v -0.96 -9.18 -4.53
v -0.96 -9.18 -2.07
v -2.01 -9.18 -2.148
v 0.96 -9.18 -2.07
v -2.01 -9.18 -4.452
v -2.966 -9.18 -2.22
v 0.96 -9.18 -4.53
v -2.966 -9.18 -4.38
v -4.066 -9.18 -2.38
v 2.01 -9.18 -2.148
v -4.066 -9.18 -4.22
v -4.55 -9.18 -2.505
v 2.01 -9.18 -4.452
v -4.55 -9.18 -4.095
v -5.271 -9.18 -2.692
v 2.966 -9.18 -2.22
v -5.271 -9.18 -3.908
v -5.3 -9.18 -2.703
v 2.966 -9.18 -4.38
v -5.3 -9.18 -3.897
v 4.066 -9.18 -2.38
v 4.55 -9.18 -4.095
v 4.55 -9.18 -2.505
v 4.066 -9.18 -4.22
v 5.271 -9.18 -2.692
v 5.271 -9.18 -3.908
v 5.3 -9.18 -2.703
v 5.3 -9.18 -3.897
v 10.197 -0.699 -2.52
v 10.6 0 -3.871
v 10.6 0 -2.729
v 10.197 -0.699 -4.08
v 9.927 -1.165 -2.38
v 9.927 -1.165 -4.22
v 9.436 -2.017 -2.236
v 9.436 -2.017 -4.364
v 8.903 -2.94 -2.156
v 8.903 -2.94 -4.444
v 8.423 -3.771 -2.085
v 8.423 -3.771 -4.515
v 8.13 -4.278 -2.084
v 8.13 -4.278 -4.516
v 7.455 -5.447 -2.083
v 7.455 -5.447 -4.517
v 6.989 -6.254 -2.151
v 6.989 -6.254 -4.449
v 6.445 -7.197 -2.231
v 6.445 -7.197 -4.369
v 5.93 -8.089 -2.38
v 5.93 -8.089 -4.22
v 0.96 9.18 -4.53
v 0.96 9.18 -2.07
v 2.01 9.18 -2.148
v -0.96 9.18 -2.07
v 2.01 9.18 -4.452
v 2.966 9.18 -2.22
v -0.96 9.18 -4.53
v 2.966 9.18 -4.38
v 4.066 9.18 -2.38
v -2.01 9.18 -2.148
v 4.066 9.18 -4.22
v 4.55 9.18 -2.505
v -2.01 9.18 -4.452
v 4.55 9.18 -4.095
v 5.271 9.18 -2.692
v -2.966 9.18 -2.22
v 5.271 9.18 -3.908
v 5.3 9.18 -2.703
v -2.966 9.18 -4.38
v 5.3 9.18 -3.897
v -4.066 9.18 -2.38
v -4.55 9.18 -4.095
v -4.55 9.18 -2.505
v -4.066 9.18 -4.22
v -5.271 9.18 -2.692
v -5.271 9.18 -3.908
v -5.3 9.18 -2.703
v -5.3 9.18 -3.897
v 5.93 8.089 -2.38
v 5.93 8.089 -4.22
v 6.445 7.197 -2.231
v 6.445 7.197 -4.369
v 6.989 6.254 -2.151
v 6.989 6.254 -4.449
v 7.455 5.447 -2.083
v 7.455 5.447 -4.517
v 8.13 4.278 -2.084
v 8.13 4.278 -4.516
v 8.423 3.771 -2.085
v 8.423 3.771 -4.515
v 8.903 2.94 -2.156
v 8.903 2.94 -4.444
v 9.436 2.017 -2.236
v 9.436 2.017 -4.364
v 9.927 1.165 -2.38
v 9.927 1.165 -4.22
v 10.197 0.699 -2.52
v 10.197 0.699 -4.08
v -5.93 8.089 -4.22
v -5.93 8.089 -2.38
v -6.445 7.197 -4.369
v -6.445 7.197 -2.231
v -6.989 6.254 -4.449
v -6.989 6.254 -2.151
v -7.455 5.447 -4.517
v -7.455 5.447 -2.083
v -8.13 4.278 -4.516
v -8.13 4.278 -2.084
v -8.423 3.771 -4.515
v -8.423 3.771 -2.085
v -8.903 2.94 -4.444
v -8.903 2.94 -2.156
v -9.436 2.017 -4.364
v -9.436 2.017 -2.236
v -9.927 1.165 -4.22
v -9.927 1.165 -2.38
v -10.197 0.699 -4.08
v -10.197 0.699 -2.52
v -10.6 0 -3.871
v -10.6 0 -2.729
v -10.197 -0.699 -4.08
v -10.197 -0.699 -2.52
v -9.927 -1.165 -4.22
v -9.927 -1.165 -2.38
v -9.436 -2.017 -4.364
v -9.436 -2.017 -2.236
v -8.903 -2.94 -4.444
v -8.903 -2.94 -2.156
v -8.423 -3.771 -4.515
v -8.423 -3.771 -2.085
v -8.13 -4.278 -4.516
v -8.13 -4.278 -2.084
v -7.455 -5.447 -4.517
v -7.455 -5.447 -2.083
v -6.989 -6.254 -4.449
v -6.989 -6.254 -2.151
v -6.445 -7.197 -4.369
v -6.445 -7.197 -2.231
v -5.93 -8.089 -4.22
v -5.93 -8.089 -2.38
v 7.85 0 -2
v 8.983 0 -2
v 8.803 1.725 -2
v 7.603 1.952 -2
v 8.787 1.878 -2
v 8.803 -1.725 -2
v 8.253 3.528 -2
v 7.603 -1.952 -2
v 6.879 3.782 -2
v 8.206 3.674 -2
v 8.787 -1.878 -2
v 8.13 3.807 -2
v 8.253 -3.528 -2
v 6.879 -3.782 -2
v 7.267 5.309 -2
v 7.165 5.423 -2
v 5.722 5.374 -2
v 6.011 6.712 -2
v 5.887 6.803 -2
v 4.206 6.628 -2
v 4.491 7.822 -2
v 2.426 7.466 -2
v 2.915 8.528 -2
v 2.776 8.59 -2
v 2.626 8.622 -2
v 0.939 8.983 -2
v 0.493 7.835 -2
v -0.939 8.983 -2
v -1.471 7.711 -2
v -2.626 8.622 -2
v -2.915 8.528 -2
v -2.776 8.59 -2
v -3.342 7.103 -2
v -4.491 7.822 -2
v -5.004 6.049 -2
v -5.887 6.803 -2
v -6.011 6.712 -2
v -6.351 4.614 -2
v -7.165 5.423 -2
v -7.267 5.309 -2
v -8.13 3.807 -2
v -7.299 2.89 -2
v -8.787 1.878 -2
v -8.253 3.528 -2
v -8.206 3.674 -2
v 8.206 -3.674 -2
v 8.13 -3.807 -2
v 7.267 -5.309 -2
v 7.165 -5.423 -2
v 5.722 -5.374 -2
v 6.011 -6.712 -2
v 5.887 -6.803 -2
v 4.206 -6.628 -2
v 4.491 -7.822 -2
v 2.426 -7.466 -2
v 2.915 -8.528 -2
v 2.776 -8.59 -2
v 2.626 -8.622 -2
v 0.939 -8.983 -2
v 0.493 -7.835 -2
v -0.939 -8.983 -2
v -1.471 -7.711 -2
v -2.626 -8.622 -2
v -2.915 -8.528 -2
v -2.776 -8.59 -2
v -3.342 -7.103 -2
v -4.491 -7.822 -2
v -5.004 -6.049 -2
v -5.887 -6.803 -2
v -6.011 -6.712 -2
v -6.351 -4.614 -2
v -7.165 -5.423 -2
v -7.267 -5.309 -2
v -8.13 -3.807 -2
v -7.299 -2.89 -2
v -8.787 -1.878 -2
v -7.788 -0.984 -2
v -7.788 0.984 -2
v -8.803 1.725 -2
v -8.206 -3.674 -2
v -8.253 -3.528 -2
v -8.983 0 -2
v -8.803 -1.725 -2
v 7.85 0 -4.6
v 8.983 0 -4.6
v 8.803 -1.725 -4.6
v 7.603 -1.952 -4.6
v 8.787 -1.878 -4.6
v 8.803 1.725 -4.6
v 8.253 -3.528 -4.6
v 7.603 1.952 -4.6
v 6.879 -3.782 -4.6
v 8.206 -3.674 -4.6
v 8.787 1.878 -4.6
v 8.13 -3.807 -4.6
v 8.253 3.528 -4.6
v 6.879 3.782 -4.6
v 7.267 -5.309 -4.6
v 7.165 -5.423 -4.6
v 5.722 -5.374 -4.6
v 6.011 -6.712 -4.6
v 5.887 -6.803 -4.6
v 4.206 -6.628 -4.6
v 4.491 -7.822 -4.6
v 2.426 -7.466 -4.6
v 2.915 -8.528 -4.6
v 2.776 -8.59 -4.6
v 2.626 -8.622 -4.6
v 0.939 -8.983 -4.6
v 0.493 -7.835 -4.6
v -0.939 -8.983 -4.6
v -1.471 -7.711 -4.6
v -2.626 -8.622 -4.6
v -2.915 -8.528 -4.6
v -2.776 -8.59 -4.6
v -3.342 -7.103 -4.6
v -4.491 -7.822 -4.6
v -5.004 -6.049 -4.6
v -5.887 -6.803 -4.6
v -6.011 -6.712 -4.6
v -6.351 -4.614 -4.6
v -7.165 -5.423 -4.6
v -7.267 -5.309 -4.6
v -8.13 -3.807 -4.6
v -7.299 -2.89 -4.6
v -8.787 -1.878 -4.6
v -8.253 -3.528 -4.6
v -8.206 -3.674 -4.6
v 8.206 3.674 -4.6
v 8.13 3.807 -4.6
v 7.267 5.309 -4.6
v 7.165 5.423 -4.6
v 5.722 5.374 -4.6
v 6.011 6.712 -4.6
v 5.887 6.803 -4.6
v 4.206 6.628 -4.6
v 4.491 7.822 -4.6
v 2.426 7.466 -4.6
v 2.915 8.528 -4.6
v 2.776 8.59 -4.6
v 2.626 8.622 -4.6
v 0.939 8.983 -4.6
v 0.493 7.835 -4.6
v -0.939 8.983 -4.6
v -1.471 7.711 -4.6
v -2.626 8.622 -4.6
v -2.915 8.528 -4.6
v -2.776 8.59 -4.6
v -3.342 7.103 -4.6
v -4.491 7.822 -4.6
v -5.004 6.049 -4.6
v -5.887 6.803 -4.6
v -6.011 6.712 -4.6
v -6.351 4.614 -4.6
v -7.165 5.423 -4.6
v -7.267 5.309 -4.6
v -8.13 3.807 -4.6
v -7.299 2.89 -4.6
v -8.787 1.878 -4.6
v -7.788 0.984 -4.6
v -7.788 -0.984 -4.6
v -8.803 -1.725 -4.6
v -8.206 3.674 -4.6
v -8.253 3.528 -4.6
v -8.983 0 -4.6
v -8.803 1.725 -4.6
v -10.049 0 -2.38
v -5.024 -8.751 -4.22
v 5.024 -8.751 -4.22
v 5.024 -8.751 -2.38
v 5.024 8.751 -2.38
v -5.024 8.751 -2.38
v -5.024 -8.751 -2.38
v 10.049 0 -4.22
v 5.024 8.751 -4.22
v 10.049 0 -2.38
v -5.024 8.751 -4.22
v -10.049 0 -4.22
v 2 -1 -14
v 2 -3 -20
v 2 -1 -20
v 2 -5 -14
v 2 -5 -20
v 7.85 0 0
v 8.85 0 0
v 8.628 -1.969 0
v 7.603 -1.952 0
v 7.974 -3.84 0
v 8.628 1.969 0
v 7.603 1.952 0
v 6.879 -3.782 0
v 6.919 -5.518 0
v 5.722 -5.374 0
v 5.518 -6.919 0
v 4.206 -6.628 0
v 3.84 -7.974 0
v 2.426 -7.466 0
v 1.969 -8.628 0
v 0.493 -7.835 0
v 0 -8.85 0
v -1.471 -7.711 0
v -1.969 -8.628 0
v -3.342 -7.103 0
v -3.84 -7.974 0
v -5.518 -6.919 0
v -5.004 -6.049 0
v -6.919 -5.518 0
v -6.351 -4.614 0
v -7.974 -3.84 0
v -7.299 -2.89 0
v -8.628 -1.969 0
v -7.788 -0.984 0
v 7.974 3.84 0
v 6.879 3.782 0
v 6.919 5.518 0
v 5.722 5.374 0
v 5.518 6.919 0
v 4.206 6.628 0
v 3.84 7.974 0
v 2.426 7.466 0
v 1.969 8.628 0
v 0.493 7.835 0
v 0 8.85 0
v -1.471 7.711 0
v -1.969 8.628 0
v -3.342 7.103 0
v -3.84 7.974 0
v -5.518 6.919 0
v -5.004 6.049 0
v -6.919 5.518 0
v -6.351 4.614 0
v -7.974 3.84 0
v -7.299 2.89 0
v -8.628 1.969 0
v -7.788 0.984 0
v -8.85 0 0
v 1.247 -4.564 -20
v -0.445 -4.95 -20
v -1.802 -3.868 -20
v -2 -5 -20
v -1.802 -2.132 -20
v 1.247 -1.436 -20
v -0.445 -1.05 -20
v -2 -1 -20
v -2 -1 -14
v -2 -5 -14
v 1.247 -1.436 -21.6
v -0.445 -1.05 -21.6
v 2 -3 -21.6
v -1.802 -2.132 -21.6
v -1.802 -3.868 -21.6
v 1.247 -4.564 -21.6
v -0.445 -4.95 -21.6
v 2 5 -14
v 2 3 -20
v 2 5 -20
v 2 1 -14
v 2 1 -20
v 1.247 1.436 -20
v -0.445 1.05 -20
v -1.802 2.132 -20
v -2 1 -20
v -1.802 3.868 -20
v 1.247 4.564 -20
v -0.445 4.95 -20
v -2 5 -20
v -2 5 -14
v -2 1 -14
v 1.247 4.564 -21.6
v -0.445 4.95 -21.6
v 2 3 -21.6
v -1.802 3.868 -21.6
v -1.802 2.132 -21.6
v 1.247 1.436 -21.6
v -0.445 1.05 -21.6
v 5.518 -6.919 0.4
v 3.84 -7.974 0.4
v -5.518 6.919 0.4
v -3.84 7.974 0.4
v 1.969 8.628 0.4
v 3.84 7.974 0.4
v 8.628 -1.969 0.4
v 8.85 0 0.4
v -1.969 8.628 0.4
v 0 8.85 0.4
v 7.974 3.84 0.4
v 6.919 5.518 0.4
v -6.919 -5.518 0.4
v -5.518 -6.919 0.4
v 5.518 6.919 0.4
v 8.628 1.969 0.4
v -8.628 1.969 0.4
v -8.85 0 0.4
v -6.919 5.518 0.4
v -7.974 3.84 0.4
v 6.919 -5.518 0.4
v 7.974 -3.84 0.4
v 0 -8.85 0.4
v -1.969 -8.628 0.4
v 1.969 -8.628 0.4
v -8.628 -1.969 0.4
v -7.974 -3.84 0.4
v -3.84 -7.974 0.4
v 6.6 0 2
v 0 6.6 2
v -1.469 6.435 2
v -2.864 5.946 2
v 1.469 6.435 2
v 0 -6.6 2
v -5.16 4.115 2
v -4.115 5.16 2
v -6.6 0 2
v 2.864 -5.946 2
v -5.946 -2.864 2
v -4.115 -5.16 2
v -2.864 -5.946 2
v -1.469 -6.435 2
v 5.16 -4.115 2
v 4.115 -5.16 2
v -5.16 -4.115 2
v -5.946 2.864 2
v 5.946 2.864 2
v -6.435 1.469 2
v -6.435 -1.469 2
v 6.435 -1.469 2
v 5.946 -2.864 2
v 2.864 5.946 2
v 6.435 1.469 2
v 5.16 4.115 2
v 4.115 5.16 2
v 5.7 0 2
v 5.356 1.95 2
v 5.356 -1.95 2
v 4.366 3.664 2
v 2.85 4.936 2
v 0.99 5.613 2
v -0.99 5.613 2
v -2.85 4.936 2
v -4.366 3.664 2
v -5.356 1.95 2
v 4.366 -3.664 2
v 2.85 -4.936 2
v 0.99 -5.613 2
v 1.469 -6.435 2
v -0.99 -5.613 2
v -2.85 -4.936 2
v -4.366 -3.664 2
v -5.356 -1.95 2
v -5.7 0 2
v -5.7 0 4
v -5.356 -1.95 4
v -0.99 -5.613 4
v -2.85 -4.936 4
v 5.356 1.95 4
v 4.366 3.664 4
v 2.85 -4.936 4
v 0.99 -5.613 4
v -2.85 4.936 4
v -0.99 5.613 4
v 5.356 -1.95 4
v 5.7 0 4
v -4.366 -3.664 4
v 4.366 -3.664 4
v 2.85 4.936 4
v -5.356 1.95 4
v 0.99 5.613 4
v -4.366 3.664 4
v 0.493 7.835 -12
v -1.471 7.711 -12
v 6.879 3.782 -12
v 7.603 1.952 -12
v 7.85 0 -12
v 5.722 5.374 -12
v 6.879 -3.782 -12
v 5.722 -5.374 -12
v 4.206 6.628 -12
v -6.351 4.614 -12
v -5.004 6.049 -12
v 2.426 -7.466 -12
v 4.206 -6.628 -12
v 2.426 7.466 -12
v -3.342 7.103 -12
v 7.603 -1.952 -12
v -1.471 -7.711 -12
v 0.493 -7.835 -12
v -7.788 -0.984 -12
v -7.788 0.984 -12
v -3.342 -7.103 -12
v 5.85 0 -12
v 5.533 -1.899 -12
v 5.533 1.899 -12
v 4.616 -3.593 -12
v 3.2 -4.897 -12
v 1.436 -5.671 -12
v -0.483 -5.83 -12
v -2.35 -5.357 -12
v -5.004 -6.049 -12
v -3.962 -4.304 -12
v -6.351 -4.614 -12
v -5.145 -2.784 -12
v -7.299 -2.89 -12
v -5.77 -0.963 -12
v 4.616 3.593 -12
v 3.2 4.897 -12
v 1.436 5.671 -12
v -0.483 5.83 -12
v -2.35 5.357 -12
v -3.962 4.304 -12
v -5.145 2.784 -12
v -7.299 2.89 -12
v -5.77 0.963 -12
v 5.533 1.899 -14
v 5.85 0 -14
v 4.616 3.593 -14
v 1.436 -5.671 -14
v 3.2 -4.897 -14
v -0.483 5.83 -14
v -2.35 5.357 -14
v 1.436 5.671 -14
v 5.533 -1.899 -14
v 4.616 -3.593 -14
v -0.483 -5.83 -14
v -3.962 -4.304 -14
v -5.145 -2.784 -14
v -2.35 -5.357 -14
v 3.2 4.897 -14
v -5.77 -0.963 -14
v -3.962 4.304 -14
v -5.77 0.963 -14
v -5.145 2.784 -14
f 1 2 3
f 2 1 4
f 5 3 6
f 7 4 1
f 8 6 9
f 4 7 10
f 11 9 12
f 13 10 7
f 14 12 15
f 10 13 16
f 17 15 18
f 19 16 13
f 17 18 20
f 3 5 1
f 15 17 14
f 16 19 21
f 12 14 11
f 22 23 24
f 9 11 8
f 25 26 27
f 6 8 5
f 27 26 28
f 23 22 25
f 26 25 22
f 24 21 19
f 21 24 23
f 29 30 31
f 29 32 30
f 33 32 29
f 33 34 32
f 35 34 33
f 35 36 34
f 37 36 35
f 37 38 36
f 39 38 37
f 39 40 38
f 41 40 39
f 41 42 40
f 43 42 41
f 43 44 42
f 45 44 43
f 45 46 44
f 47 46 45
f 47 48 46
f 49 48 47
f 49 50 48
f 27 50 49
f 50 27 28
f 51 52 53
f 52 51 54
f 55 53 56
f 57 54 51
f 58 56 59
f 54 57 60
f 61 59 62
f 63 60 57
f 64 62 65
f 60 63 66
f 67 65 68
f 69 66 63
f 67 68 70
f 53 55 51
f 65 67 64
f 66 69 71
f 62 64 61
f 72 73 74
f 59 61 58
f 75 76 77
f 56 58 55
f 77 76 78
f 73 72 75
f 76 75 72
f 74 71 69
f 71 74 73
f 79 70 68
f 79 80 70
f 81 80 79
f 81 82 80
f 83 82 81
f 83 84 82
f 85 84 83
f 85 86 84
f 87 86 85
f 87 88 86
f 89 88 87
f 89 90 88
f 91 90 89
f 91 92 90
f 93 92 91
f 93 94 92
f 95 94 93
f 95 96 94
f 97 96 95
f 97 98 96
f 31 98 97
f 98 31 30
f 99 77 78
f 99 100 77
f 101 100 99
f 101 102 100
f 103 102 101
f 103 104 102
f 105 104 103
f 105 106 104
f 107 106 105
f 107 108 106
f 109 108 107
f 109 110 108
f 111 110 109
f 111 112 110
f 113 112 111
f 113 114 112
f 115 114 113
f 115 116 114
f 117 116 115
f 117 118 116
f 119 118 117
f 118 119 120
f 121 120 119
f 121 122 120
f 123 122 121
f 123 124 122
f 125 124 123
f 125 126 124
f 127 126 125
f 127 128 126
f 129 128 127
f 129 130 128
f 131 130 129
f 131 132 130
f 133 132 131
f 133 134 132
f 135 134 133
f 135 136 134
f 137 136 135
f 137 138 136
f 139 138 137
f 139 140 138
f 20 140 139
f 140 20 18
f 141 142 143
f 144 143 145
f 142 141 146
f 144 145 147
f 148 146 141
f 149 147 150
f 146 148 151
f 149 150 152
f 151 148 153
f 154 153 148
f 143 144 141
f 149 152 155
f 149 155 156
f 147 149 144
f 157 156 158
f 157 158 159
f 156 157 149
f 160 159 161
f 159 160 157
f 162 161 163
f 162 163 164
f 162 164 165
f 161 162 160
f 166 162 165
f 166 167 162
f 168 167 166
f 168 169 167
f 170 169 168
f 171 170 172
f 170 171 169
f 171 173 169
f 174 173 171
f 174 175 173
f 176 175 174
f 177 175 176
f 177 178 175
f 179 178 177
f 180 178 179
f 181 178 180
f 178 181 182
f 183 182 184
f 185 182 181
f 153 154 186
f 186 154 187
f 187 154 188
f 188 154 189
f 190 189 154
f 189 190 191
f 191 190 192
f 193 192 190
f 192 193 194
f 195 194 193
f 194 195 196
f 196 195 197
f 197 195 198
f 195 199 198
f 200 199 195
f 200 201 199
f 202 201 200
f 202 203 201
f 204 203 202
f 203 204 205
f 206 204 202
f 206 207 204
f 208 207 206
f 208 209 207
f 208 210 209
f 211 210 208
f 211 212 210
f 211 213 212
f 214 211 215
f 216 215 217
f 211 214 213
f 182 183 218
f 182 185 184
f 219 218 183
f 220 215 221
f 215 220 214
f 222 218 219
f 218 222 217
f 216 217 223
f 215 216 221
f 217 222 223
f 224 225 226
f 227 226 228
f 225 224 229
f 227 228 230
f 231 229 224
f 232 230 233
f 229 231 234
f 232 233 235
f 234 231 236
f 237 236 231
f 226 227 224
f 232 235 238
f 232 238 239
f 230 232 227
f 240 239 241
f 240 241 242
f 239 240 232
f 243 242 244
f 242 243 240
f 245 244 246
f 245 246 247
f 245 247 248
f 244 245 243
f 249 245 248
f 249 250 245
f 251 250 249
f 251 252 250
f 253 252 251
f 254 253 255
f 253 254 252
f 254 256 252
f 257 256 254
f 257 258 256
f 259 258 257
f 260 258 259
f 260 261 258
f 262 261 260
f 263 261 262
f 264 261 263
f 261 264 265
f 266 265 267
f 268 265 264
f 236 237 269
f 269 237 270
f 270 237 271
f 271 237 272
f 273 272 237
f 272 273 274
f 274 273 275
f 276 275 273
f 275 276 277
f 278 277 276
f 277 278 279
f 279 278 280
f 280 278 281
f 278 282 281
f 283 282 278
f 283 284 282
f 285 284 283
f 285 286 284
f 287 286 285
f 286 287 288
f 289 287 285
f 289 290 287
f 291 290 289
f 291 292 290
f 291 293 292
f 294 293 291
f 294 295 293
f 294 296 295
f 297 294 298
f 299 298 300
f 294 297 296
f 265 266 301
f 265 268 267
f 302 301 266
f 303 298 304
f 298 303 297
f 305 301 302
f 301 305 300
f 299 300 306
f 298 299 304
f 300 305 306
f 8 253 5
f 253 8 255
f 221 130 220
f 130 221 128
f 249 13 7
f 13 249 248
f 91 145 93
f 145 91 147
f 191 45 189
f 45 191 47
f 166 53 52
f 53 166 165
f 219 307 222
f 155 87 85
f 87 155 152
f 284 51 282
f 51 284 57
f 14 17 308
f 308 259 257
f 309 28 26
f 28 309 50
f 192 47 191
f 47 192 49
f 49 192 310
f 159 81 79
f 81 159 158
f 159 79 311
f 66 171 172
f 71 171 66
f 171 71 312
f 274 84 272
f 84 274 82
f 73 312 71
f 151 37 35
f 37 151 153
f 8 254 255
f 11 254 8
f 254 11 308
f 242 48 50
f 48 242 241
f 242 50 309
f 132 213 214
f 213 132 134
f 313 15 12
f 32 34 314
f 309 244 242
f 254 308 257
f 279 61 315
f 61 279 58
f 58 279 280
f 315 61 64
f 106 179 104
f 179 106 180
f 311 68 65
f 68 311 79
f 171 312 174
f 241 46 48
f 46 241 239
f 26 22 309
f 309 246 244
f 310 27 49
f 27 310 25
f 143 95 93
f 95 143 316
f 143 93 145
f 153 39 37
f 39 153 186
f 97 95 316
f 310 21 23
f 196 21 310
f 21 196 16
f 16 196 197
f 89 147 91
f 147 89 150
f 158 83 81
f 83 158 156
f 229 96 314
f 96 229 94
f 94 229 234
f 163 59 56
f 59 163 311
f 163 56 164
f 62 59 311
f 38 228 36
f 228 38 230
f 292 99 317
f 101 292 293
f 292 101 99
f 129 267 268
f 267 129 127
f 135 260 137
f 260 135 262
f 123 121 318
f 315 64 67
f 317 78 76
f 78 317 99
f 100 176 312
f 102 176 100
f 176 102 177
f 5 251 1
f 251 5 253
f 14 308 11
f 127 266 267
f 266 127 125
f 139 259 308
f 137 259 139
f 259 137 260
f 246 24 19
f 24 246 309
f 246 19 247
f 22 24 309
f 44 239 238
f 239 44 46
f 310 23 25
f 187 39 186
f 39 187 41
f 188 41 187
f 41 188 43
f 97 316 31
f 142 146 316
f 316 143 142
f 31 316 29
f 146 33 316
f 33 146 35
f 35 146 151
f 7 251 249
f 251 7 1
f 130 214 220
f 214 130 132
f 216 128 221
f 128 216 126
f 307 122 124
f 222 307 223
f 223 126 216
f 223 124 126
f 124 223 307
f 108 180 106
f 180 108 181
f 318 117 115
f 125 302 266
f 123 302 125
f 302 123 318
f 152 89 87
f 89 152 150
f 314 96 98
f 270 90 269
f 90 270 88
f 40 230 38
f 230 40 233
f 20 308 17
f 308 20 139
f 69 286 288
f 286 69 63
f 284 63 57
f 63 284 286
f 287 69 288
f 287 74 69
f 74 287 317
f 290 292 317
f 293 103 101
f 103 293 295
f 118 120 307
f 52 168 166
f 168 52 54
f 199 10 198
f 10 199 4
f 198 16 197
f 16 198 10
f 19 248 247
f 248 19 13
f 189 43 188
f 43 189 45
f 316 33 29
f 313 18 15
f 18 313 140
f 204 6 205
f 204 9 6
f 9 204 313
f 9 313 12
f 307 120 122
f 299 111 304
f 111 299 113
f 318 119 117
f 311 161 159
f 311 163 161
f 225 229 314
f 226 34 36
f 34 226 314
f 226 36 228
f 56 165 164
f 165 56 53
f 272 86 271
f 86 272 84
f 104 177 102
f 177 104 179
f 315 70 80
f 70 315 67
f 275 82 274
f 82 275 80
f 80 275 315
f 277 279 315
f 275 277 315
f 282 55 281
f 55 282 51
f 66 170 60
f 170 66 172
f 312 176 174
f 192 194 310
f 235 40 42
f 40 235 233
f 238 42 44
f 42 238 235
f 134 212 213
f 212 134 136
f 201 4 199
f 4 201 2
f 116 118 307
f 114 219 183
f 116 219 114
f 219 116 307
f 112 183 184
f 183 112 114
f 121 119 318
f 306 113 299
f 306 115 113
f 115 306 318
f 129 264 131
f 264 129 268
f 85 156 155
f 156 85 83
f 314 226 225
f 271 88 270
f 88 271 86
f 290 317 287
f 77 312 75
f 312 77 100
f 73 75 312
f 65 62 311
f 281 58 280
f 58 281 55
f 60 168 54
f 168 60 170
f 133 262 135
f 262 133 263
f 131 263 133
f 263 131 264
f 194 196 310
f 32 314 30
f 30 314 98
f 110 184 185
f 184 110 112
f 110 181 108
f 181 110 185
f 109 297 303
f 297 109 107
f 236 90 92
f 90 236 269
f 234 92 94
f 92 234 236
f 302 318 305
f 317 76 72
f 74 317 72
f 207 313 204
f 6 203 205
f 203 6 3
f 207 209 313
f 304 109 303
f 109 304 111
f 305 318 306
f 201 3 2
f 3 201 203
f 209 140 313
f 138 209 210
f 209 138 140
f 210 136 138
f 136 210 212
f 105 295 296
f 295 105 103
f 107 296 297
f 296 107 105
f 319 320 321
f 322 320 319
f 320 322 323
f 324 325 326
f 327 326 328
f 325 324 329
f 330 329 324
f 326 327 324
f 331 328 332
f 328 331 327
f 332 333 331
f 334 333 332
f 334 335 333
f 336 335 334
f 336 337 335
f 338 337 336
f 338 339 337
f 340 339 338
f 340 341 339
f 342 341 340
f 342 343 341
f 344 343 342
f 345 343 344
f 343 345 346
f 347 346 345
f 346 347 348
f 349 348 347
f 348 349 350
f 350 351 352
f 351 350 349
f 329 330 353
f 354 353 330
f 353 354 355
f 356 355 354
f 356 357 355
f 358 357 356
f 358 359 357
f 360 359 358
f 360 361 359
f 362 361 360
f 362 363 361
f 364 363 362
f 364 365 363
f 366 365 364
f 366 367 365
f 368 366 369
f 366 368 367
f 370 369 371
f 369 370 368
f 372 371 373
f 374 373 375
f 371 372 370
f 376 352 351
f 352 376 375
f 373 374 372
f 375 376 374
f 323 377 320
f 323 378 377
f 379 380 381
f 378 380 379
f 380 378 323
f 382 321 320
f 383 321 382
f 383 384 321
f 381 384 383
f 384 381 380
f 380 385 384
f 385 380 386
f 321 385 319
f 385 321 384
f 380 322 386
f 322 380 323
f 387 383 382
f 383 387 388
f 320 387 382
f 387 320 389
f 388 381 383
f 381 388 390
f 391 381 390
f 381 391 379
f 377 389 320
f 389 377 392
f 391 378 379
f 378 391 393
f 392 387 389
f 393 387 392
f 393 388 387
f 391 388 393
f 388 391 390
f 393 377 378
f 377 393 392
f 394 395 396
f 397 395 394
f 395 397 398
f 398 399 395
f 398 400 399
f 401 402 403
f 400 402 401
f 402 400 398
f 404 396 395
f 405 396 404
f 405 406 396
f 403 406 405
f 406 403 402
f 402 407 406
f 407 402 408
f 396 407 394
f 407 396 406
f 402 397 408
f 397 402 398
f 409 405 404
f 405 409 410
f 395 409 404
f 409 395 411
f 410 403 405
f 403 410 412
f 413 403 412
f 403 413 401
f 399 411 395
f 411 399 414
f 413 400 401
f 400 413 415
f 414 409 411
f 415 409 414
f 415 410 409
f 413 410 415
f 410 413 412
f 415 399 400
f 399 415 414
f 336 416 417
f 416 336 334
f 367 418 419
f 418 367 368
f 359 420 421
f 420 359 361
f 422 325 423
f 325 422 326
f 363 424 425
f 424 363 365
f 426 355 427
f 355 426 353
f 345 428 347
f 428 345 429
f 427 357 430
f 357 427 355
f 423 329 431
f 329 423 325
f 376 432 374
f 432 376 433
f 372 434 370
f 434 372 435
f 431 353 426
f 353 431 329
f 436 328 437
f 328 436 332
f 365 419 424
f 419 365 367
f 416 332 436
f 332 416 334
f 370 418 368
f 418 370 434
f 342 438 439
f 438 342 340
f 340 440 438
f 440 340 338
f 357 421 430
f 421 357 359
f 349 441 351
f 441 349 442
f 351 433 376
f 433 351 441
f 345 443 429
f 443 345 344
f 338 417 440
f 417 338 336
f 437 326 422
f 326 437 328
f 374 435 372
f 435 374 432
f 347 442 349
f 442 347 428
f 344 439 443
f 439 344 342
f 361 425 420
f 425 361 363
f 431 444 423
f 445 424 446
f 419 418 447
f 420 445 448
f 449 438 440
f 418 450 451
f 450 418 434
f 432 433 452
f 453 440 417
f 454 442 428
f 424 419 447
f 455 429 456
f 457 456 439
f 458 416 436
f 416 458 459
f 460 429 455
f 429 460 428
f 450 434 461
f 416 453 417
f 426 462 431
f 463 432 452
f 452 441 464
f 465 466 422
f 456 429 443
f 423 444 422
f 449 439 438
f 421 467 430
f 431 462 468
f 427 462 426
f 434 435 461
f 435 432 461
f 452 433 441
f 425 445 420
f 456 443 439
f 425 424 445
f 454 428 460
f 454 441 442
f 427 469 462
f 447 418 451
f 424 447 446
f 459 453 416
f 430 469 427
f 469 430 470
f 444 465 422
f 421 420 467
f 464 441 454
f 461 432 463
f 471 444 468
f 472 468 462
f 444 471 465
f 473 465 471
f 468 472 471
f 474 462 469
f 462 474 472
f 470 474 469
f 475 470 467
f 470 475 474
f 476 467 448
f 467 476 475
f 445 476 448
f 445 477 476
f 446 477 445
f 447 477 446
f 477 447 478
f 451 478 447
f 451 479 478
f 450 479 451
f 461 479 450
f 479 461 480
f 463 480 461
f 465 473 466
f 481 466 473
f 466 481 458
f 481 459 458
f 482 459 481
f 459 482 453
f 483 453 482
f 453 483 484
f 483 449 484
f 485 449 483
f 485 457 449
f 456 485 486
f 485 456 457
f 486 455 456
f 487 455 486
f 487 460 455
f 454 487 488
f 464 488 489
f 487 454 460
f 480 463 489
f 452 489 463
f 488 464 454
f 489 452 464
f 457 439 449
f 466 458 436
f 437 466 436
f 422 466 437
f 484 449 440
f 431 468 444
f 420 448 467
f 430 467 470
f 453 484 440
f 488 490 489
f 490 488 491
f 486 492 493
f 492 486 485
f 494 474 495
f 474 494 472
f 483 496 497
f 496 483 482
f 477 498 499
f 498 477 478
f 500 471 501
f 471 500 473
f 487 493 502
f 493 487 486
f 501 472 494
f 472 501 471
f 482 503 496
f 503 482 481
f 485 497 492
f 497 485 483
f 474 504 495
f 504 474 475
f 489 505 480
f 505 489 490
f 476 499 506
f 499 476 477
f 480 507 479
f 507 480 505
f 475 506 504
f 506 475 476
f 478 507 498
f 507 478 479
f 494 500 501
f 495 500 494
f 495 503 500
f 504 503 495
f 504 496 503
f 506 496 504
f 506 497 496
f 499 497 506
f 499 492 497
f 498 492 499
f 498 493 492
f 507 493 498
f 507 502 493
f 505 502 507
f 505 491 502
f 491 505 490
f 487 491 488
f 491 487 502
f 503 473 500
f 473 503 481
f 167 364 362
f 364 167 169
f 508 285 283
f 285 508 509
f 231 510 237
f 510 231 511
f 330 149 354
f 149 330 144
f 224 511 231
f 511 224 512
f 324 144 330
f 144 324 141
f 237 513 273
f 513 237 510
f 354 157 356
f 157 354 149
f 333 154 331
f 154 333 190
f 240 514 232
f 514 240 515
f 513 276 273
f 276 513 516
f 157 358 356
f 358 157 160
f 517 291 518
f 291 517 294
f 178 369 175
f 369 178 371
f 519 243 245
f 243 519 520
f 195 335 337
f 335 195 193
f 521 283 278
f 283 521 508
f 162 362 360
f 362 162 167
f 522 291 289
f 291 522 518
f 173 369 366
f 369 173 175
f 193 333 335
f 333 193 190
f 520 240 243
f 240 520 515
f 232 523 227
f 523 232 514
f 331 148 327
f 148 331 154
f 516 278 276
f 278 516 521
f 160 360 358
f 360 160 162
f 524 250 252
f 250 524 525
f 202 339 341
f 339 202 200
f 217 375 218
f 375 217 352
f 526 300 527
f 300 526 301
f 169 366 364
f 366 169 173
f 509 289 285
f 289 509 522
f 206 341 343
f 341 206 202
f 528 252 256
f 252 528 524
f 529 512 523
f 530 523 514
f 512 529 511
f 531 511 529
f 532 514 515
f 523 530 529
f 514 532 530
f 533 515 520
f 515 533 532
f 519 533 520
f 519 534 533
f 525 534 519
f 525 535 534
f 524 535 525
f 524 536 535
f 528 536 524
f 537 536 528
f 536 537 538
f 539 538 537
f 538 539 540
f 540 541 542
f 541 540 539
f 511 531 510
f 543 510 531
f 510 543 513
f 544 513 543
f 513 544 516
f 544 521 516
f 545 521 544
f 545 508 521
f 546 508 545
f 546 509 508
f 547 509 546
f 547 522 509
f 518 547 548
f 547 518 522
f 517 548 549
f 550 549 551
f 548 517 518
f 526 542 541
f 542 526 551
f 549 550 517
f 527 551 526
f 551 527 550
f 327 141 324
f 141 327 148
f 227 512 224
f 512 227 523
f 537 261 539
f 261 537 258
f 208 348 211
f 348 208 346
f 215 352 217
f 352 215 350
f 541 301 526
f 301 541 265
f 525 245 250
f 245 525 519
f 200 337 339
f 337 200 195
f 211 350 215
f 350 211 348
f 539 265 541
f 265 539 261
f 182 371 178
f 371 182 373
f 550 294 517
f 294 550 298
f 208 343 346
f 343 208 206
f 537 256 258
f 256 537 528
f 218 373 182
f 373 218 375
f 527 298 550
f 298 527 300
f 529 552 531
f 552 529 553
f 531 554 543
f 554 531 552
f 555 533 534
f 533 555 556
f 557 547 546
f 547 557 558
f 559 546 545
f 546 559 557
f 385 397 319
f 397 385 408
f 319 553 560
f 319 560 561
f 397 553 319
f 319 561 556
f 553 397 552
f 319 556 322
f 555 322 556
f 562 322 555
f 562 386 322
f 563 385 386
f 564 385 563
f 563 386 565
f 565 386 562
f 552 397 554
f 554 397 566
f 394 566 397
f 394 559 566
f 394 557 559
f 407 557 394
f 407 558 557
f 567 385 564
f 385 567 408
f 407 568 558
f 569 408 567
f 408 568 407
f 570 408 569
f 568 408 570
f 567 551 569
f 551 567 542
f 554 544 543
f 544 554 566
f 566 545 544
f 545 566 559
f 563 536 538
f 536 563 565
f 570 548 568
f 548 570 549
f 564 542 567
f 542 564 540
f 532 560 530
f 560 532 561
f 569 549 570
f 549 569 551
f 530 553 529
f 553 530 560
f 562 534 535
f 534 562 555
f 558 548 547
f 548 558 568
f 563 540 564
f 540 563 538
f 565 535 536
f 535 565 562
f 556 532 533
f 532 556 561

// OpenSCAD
module button() {
  color([0.7, 0.7, 0.7]) {
     // cap
    cylinder(d=17.7, h=0.4);
    translate([0, 0, 0.4]) cylinder(d1=17.7, d2=13.2, h=2-0.4);

    cylinder(d=11.4, h=4); // button
    translate([0, 0, -12]) cylinder(d=15.7, h=12); // thread

    // bolt
    translate([0, 0, -2 - 2.6/2]) {
      intersection() {
        cylinder(d=21.2, h=2.6, $fn=6, center=true);
        resize([22, 22, 4.5]) sphere(d=24);
      }
    }

    // connectors
    for (y = [-3, 3]) {
      translate([0, y, -20 / 2]) cube([4, 4, 20], center=true);
      translate([0, y, -21.6])cylinder(d=4, h=21.6);
    }
  }

  // blue plastic
  color([0.2, 0.2, 1])
    translate([0, 0, -12-2])
      cylinder(d=11.7, h=2);
}

button();
